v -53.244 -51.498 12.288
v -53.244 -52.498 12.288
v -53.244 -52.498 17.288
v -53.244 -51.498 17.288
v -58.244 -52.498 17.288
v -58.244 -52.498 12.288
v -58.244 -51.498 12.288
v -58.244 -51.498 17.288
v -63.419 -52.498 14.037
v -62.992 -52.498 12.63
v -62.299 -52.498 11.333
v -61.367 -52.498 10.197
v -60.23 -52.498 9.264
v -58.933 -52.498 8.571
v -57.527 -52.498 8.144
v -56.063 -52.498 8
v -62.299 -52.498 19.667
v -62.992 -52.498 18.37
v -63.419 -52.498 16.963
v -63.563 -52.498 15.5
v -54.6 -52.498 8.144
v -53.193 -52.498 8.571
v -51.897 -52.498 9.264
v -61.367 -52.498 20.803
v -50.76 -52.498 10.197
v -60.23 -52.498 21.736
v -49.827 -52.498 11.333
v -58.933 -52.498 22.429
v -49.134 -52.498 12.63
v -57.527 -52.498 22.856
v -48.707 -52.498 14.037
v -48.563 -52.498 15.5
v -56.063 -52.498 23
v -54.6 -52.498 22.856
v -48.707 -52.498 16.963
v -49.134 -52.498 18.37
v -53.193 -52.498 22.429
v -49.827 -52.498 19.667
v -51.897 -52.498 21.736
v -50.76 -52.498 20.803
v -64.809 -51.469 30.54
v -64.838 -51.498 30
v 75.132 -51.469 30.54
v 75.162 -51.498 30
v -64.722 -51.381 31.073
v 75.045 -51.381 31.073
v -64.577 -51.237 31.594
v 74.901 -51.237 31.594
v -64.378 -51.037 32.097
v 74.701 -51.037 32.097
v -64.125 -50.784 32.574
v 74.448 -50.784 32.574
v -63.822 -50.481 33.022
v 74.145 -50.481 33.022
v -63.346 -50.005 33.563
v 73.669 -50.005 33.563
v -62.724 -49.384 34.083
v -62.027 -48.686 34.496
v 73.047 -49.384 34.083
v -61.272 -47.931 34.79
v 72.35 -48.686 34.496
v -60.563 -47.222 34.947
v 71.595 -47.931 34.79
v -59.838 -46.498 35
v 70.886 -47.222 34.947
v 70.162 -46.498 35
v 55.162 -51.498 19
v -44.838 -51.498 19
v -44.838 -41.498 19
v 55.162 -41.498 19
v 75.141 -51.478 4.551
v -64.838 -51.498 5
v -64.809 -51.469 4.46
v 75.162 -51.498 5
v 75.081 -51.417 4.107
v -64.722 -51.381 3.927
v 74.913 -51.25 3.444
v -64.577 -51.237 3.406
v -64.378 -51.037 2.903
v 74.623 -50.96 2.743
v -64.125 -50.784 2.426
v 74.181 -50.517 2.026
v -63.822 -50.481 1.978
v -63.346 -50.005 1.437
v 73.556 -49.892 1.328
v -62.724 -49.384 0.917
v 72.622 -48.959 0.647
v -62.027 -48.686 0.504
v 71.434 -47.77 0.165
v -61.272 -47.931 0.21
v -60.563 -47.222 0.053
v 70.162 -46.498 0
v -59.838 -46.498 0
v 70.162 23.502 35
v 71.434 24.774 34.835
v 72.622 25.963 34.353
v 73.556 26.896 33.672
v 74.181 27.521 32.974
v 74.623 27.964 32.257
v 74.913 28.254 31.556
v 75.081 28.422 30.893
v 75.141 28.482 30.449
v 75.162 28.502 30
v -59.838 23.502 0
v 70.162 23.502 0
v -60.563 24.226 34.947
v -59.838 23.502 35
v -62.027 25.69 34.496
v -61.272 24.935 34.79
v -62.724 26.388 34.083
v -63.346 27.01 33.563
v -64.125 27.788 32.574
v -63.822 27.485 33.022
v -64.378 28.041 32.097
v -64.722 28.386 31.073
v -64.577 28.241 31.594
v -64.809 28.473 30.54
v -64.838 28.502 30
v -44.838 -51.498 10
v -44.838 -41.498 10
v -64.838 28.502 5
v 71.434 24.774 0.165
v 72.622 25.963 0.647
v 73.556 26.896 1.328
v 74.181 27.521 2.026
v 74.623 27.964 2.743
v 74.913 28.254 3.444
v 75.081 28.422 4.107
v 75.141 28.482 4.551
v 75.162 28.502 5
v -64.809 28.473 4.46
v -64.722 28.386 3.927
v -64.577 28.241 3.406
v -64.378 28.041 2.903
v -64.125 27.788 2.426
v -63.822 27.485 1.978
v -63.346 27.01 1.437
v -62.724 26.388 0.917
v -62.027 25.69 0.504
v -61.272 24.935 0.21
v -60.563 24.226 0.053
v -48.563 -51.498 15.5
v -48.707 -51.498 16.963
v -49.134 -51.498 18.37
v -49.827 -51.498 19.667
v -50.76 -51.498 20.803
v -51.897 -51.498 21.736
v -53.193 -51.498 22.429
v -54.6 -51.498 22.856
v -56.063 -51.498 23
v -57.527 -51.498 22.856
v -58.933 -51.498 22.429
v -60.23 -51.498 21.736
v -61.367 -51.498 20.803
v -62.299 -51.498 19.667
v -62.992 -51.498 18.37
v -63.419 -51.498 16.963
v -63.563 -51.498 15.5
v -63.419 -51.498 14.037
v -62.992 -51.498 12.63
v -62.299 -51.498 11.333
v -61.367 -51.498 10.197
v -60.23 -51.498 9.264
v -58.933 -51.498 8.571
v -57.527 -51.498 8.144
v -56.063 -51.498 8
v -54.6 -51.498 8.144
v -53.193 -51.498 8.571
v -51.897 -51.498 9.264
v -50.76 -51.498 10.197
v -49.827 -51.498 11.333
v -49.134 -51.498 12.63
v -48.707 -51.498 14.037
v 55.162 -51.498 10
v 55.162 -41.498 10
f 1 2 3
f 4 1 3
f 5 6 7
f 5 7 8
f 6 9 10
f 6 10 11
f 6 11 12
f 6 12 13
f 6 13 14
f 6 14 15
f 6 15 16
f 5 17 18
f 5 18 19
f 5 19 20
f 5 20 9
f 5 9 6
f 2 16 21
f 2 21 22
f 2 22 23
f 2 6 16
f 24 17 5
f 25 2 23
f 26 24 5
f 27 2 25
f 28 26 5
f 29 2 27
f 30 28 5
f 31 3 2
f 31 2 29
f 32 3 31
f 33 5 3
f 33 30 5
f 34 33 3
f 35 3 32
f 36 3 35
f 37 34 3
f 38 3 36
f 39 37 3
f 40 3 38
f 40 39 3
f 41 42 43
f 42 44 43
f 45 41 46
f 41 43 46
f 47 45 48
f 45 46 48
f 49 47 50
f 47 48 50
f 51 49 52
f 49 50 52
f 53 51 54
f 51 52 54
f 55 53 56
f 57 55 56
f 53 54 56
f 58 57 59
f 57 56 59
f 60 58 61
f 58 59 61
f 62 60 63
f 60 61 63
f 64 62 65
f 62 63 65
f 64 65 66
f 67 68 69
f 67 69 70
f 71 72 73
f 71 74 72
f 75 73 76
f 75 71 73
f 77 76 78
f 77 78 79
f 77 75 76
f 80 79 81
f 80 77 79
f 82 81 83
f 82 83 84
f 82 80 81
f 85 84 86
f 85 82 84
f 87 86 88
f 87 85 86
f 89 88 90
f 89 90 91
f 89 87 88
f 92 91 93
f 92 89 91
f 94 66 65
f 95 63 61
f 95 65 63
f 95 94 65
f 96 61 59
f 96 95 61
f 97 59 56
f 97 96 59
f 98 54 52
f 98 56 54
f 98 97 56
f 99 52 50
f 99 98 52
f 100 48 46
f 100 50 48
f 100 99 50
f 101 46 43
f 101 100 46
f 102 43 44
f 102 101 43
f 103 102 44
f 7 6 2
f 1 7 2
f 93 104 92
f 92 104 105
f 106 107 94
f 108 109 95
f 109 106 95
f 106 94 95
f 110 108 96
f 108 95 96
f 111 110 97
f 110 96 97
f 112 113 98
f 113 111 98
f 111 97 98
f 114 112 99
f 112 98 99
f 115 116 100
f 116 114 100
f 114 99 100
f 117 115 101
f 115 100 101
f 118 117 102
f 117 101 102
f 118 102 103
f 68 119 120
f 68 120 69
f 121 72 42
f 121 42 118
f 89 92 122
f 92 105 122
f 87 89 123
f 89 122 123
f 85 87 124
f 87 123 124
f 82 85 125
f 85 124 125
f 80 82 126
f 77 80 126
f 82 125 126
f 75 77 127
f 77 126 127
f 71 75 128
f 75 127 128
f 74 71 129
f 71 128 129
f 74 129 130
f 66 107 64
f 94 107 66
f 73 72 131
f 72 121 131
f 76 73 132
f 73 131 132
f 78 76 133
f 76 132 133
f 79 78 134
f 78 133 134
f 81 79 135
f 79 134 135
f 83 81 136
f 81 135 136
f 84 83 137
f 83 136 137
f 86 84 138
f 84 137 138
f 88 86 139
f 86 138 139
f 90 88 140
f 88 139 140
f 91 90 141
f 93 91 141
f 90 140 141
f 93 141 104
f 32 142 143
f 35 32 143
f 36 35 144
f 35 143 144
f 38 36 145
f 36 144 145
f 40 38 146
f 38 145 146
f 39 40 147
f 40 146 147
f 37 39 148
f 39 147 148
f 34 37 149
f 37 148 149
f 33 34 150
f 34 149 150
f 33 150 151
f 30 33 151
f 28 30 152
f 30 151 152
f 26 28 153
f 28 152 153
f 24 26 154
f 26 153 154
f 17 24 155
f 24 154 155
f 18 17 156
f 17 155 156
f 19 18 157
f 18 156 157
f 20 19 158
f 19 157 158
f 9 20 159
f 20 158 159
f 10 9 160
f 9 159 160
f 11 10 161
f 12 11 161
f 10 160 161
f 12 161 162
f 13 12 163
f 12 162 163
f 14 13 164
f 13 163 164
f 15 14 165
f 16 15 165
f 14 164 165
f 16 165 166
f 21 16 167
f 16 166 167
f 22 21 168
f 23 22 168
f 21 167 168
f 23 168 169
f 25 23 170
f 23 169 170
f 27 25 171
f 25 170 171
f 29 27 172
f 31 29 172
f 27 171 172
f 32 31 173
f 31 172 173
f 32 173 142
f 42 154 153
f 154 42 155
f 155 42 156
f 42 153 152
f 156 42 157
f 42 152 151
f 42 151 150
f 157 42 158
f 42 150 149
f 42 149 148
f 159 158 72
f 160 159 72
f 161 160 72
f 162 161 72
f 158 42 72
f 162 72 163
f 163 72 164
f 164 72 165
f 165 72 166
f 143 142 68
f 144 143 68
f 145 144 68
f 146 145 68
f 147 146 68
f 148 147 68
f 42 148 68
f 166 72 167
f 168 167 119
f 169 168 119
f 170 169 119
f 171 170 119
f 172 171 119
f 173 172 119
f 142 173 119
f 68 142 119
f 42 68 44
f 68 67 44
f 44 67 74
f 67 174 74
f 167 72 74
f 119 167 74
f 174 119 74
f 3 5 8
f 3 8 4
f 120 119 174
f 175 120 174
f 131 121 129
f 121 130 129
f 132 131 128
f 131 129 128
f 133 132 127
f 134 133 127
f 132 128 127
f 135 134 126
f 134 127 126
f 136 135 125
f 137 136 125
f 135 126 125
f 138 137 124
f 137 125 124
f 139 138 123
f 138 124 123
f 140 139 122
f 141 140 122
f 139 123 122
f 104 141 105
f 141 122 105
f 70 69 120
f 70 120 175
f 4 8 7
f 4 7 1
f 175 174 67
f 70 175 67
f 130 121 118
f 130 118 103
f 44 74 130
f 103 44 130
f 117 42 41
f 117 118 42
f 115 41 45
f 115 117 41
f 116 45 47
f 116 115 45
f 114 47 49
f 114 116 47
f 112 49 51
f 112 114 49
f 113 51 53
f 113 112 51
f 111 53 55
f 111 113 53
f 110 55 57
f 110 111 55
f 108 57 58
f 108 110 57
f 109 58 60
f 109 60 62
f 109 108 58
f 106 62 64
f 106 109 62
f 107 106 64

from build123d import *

# Parameters (mm, degrees)
F0_W      = 140
F0_H      = 80
F1_DEPTH  = 35
F2_W      = 100
F2_H      = 9
F3_DEPTH  = 10
F5_R      = 5
F6_R      = 5
F7_R      = 7.5
F8_DEPTH  = 1
F9_W      = 5
F9_H      = 5
F10_DEPTH = 1


with BuildPart() as f1:
    # F0 (on Top) → F1 (new body)
    with BuildSketch(Plane.XY):
        with Locations((5.1616433263, -11.4978505671)):
            Rectangle(F0_W, F0_H)
    extrude(amount=F1_DEPTH)

    # F2 (on face) → F3 (cut)
    with BuildSketch(Plane.XZ.offset(51.4978505671)):
        with Locations((5.1616433263, 14.5)):
            Rectangle(F2_W, F2_H)
    extrude(amount=-F3_DEPTH, mode=Mode.SUBTRACT)

    # F5
    f5_edges = [f1.edges().sort_by_distance(p)[0] for p in [
        (75.161643, -11.497851, 0),
        (5.161643, -51.497851, 0),
        (5.161643, 28.502149, 0),
        (-64.838357, -11.497851, 0),
    ]]
    fillet(f5_edges, radius=F5_R)

    # F6
    f6_edges = [f1.edges().sort_by_distance(p)[0] for p in [
        (-64.838357, -11.497851, 35),
        (5.161643, 28.502149, 35),
        (5.161643, -51.497851, 35),
        (75.161643, -11.497851, 35),
    ]]
    fillet(f6_edges, radius=F6_R)

    # F7 (on face) → F8 (join)
    with BuildSketch(Plane.XZ.offset(51.4978505671)):
        with Locations((-56.063328834, 15.5)):
            Circle(F7_R)
    extrude(amount=F8_DEPTH)

    # F9 (on face) → F10 (cut)
    with BuildSketch(Plane.XZ.offset(52.4978505671)):
        with Locations((-55.7435365021, 14.7882593423)):
            Rectangle(F9_W, F9_H)
    extrude(amount=-F10_DEPTH, mode=Mode.SUBTRACT)


solid = f1.part
